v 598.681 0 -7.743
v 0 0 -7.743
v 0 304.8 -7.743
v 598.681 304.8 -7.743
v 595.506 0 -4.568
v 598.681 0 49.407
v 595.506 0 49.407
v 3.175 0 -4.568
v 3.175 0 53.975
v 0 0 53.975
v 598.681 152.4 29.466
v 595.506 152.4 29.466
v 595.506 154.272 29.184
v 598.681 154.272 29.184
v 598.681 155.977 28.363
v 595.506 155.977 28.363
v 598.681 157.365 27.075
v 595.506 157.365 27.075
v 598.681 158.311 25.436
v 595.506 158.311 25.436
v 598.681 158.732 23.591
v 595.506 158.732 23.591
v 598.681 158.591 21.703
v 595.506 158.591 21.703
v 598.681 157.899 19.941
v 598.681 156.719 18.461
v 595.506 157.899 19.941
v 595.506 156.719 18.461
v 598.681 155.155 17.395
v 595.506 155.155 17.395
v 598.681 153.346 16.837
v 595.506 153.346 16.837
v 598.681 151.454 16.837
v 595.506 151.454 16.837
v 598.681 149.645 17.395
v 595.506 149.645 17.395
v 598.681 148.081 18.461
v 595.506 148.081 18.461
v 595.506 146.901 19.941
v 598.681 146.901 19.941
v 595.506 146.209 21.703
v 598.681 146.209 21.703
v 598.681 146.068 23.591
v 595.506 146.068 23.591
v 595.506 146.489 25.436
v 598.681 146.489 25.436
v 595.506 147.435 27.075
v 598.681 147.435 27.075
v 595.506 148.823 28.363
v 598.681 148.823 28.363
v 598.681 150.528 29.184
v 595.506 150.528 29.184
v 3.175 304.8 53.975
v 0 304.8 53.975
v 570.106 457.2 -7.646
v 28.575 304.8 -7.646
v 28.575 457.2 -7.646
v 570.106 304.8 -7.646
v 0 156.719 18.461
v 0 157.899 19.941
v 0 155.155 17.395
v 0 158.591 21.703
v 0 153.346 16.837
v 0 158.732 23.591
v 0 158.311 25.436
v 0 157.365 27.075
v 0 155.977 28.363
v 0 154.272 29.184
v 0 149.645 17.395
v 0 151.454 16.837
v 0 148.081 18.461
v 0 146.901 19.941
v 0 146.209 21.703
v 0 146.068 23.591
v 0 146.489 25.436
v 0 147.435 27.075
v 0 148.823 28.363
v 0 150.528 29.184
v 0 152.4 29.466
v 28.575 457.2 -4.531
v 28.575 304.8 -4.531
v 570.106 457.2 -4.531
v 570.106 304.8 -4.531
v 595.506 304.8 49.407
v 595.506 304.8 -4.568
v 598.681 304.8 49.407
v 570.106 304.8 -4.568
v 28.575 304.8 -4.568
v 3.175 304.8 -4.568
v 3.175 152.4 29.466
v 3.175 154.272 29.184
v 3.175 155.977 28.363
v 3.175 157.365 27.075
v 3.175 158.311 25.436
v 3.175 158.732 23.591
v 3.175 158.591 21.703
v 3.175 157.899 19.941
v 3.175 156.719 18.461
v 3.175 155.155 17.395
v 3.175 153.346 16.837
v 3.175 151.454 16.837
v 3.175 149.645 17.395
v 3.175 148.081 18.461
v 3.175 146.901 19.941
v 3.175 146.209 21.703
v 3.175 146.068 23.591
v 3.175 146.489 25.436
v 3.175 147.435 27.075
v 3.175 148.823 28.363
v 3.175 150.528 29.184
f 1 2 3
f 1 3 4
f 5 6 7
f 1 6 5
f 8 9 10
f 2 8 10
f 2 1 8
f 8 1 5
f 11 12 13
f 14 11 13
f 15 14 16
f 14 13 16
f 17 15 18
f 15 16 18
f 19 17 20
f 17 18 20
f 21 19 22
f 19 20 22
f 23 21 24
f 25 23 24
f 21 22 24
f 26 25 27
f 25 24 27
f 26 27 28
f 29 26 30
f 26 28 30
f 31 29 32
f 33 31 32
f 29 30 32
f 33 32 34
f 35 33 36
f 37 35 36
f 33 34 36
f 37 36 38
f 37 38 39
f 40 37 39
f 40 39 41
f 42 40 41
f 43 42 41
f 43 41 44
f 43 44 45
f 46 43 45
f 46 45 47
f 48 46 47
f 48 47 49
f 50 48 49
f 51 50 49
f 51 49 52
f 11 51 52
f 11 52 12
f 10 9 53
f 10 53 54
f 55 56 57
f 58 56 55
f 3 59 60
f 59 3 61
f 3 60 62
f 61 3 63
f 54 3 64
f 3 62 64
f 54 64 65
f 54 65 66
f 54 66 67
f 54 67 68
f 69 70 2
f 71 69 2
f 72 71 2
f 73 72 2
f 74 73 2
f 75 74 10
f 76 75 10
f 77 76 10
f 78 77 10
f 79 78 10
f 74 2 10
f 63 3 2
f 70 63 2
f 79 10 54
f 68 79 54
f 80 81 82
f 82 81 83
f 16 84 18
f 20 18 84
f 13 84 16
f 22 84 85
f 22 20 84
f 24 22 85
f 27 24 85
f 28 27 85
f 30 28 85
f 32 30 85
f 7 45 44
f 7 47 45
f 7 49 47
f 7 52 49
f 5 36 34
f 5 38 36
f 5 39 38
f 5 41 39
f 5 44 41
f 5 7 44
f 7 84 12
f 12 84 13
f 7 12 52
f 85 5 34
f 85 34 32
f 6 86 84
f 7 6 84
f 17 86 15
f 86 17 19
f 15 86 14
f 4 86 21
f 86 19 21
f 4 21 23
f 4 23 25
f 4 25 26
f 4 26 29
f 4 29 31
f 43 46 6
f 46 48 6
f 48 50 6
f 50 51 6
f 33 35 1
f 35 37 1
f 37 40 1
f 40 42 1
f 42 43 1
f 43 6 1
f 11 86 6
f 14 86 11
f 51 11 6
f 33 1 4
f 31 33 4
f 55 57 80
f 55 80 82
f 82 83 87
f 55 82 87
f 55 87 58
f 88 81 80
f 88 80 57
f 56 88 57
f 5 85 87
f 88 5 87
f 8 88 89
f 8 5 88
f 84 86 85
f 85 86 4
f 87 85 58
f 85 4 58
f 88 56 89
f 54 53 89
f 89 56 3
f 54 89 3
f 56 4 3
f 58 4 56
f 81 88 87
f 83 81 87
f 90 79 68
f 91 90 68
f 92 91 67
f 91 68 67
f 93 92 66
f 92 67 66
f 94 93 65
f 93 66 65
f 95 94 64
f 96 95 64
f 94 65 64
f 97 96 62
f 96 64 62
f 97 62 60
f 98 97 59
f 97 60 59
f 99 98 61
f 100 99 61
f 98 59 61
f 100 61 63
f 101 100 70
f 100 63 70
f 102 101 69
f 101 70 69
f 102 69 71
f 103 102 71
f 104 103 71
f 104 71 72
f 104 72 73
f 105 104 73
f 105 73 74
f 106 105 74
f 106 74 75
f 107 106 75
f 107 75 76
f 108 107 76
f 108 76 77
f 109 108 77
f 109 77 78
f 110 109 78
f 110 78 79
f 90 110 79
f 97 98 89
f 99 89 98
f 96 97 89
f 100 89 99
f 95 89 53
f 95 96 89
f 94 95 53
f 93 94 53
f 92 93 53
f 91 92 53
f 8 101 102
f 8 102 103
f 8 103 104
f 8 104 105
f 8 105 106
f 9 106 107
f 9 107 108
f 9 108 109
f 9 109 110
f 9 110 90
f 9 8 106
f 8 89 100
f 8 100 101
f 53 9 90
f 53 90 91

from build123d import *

# Parameters (mm, degrees)
BOSS_EXTRUDE1_DEPTH = 304.8
SKETCH4_R           = 6.35
CUT_EXTRUDE1_DEPTH  = 599.68125614
SKETCH5_W           = 541.53125614
SKETCH5_H           = 3.114661147
BOSS_EXTRUDE2_DEPTH = 152.4


with BuildPart() as part:
    # Sketch1 → Boss-Extrude1 (new body)
    with BuildSketch(Plane(origin=(0, 0, 0), x_dir=(1, 0, 0), z_dir=(0, 1, 0))):
        Polygon((595.50625614, 4.567872613), (3.175, 4.567872613), (3.175, -53.975), (0, -53.975), (0, 0), (0, 7.742872613), (598.68125614, 7.742872613), (598.68125614, 4.567872613), (598.68125614, -49.407127387), (595.50625614, -49.407127387), align=None)
    extrude(amount=BOSS_EXTRUDE1_DEPTH)

    # Sketch4 → Cut-Extrude1 (cut, through all)
    with BuildSketch(Plane.ZY):
        with Locations((23.116063694, 152.4)):
            Circle(SKETCH4_R)
    extrude(amount=-CUT_EXTRUDE1_DEPTH, mode=Mode.SUBTRACT)

    # Sketch5 → Boss-Extrude2 (add)
    with BuildSketch(Plane(origin=(0, 304.8, 0), x_dir=(1, 0, 0), z_dir=(0, 1, 0))):
        with Locations((299.34062807, 6.088586102)):
            Rectangle(SKETCH5_W, SKETCH5_H)
    extrude(amount=BOSS_EXTRUDE2_DEPTH)


solid = part.part
